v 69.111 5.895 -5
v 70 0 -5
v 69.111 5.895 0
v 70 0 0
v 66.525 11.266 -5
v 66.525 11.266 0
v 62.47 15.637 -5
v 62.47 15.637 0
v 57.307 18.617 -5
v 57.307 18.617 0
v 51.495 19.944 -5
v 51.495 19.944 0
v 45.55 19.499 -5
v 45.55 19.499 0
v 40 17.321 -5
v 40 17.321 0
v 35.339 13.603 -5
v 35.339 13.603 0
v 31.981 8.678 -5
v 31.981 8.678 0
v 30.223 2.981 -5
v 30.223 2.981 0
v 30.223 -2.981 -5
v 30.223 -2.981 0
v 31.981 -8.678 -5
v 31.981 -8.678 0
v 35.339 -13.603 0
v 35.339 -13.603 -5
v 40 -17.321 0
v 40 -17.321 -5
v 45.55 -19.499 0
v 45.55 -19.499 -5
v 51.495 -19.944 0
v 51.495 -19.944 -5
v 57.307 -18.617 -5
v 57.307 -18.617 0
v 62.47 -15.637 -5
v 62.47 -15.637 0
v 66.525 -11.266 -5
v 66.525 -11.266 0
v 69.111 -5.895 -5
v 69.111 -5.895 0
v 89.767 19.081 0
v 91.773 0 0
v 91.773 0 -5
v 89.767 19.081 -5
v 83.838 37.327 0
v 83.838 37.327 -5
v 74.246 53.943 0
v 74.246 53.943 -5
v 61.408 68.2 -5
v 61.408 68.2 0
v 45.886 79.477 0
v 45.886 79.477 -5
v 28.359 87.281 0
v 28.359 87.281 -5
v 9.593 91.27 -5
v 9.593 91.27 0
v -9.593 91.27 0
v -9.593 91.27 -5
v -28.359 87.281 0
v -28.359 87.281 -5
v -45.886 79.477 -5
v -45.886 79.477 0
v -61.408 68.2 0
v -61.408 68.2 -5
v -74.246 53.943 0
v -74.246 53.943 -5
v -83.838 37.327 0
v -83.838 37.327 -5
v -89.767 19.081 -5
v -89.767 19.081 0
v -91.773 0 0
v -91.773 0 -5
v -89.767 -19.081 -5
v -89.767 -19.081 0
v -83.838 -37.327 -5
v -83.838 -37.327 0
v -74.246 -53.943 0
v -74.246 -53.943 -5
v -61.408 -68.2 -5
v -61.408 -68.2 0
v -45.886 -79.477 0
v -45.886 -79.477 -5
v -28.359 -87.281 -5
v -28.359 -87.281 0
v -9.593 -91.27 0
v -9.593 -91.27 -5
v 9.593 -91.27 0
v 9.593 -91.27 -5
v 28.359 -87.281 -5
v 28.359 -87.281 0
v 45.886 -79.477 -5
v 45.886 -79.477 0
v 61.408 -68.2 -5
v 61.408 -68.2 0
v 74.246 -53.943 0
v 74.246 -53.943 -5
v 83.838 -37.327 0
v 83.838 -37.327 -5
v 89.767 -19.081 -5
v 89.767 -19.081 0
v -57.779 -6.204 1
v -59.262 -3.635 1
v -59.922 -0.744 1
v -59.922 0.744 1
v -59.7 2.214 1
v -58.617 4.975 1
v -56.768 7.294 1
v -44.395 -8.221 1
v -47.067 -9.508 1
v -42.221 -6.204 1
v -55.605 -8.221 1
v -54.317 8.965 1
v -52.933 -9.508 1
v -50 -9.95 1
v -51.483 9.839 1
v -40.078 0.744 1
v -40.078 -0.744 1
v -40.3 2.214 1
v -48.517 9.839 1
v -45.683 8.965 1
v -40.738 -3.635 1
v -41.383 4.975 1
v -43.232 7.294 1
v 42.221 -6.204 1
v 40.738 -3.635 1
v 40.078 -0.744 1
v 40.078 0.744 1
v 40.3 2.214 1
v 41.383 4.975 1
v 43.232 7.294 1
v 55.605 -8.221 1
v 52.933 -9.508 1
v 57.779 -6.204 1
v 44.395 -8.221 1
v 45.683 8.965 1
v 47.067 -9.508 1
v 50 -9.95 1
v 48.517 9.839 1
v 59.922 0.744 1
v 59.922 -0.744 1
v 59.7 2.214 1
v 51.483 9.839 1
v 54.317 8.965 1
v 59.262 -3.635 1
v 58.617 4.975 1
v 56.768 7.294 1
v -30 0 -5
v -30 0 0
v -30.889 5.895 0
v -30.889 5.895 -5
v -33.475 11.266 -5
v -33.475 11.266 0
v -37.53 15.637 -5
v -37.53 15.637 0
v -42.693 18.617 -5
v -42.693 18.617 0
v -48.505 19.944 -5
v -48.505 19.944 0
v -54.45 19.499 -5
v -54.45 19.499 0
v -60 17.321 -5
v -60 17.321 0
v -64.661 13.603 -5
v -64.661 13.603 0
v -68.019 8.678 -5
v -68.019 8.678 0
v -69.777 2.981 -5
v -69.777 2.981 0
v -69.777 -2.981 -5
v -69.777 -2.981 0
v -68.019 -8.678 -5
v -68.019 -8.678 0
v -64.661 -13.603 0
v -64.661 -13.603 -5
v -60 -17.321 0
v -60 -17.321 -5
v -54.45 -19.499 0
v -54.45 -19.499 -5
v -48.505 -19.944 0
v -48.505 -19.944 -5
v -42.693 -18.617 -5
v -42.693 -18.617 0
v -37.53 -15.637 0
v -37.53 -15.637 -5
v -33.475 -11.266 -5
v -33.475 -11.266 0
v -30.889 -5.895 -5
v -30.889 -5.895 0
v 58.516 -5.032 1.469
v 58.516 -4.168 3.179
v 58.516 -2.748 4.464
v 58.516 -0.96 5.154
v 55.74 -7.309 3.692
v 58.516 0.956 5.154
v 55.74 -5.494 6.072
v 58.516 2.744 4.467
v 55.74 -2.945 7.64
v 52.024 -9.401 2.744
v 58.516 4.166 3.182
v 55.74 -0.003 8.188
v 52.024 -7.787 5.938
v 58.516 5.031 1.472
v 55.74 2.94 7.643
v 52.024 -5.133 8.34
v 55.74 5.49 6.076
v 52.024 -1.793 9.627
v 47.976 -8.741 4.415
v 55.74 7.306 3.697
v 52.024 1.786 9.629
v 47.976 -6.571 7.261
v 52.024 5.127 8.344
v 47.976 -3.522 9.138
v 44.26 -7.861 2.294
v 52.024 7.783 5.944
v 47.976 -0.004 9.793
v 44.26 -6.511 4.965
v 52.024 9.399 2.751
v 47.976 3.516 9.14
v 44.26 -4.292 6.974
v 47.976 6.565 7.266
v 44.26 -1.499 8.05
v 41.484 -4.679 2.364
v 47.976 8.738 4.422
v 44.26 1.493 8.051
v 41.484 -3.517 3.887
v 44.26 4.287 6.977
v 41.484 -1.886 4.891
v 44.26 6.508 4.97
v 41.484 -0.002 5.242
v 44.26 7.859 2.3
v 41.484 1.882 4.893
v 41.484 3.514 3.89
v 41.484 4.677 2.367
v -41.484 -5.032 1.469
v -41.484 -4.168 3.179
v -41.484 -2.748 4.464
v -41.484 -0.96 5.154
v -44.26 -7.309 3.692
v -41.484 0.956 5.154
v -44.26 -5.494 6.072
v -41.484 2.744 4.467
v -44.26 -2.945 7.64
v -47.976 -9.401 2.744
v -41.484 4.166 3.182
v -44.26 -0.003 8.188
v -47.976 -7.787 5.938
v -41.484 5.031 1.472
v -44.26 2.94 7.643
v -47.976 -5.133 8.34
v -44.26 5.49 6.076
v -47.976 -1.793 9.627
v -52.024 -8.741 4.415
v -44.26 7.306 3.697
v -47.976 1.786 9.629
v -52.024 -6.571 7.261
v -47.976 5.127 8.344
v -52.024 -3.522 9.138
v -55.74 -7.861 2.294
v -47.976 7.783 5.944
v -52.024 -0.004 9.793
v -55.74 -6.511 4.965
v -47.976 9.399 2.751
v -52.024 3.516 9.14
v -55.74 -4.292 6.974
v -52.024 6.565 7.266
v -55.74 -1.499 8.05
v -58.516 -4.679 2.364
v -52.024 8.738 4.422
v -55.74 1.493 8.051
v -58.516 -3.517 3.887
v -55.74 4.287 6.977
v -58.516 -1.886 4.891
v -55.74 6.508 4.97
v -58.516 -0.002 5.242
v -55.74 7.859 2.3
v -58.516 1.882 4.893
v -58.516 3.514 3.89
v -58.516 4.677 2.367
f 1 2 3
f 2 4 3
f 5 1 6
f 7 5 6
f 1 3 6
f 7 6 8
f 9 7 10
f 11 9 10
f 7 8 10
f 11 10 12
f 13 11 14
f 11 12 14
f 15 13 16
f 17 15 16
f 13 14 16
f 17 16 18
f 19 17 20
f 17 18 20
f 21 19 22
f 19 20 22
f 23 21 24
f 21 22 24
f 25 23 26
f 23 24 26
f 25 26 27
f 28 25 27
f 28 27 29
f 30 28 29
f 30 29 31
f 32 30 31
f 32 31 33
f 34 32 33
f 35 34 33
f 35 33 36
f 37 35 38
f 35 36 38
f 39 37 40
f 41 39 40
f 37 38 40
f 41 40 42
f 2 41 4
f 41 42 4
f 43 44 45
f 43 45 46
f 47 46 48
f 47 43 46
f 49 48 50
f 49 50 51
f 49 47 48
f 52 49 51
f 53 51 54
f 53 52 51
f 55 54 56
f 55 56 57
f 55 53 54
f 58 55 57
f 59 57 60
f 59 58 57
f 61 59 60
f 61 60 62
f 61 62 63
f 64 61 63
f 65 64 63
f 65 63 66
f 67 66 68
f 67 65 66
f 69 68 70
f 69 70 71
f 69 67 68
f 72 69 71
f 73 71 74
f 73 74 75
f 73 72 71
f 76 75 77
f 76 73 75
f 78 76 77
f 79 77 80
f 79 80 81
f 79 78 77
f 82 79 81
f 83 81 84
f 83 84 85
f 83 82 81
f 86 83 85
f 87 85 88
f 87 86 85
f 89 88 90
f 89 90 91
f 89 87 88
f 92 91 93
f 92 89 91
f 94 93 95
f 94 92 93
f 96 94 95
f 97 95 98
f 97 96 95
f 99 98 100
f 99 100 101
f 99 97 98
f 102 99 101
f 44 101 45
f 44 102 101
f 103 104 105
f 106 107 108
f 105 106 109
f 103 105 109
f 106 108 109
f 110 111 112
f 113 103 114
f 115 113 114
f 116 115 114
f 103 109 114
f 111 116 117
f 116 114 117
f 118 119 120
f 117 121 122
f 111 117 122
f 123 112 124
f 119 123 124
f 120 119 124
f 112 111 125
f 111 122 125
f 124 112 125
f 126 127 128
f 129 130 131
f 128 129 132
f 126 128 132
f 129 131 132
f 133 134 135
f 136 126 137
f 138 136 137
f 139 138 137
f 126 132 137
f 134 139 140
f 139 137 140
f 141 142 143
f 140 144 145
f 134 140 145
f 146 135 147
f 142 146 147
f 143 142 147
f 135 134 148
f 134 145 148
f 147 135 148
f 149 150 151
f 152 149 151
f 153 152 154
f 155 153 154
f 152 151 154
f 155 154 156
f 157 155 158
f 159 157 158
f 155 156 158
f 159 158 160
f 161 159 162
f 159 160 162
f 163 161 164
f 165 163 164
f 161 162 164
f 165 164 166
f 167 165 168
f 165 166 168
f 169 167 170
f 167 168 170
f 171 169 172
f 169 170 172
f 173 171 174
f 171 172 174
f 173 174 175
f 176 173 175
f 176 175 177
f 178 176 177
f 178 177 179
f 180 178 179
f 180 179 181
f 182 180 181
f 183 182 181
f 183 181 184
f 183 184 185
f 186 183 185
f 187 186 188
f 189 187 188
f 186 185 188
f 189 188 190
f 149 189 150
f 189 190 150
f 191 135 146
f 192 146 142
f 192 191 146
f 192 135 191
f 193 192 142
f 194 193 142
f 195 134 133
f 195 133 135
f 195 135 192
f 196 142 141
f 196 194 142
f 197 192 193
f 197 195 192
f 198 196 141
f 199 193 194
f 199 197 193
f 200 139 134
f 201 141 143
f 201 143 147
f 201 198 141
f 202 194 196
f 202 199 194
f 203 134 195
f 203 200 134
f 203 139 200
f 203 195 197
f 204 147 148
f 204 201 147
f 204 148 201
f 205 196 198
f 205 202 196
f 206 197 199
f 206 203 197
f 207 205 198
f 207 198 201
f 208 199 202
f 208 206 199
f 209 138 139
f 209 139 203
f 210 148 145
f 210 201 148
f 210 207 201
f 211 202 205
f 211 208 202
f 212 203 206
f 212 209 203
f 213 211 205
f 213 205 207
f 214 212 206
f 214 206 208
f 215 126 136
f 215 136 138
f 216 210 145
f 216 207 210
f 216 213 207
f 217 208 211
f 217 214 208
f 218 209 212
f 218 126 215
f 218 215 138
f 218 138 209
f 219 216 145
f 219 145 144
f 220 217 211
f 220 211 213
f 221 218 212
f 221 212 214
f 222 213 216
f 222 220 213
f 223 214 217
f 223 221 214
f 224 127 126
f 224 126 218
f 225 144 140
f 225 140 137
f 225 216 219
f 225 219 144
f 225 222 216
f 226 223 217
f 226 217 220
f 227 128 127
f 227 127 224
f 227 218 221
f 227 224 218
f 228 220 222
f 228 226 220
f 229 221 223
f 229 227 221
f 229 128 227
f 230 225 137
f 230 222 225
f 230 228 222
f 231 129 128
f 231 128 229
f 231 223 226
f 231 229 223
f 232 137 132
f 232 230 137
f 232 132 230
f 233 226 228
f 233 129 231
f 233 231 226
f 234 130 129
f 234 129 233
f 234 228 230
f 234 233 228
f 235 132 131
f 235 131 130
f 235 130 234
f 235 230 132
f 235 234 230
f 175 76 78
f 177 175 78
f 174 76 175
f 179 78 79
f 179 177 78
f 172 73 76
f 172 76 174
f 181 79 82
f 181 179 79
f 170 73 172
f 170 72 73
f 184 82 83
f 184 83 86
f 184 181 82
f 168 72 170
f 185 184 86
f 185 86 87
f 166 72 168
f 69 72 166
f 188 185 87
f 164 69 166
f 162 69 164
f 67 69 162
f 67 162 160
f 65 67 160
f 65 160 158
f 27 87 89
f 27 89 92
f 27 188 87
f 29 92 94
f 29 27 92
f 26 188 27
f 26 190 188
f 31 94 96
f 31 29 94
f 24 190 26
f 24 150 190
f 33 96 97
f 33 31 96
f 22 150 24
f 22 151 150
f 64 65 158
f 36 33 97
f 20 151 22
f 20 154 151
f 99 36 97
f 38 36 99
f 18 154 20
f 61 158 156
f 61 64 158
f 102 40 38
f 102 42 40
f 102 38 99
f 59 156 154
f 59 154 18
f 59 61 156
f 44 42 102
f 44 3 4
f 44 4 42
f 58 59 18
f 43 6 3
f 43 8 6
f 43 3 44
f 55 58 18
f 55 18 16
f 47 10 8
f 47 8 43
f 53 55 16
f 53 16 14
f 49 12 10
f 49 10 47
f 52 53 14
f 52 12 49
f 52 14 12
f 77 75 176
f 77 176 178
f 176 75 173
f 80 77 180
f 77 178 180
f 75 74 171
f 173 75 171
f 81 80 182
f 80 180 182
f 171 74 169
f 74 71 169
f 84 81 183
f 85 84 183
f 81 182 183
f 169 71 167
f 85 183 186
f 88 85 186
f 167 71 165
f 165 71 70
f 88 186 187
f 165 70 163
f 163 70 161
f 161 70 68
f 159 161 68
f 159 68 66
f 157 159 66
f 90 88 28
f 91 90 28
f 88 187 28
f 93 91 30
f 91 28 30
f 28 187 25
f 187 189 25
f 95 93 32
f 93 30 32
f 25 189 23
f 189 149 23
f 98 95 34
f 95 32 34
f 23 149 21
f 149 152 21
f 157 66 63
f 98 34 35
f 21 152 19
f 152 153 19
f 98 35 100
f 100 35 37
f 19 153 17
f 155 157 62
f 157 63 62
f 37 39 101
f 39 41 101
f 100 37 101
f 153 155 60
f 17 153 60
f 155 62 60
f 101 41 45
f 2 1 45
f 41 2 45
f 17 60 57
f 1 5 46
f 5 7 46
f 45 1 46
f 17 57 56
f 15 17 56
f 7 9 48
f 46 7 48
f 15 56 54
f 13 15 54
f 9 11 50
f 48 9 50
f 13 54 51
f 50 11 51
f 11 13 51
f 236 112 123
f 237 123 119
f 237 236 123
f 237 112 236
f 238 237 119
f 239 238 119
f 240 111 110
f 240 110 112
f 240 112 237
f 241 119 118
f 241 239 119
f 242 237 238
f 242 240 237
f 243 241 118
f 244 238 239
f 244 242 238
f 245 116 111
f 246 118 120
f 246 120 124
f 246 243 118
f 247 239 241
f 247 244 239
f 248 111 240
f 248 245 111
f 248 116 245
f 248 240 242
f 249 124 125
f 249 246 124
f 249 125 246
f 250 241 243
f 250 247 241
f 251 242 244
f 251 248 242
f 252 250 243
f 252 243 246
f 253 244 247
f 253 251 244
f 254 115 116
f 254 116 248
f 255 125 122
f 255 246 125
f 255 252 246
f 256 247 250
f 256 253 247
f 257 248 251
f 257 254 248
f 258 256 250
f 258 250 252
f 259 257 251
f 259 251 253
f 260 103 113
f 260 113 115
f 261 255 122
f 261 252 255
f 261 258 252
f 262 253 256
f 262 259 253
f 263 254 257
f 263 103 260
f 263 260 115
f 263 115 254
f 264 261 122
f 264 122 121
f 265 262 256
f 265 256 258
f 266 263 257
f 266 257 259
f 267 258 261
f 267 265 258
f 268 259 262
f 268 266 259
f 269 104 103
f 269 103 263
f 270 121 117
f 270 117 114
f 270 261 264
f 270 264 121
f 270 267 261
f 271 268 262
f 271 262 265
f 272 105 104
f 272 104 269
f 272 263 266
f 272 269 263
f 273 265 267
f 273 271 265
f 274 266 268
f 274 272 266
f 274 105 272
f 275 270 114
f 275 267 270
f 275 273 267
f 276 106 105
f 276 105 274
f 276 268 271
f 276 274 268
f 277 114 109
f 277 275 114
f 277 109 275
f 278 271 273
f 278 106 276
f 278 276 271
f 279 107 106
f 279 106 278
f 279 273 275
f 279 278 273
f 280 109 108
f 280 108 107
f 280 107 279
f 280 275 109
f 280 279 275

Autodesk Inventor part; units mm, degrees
ref_plane "YZ Plane" through (0, 0, 0) normal (1, 0, 0) x (0, 1, 0)
ref_plane "XZ Plane" through (0, 0, 0) normal (0, 1, 0) x (-1, 0, 0)
ref_plane "XY Plane" through (0, 0, 0) normal (0, 0, 1) x (1, 0, 0)
sketch "Skizze1" plane through (0, 0, 0) normal (0, 0, 1) x (1, 0, 0)
  circle A0 centre (-50, 0) radius 10
  line L0 (0, 128.4817) -> (0, -128.4817) construction
  circle A1 centre (50, 0) radius 10
  line L1 (-60, 0) -> (-40, 0)
  line L2 (40, 0) -> (60, 0)
  line L3 (-128.4817, 0) -> (128.4817, 0) construction
  circle A2 centre (-50, 0) radius 20
  circle A3 centre (50, 0) radius 20
  circle A4 centre (0, 0) radius 91.7726
  dimension "d0" = 20
  dimension "d1" = 100
  dimension "d3" = 40
revolve "Umdrehung1" add sketch "Skizze1" angle 180 about axis through (0, 0, 0) along (1, 0, 0) picked at (-52.6218, 5.86) picked at (47.3782, 5.86) contours L1 A0 | L2 A1
extrude "Extrusion1" cut sketch "Skizze1" against normal blind 1 contours L1 A0 | A0 L1 | L2 A1 | A1 L2 | A2 | A3
extrude "Extrusion2" cut sketch "Skizze1" along normal blind 1 contours L1 A0 | A0 L1 | L2 A1 | A1 L2 | A2 | A3
extrude "Extrusion3" add sketch "Skizze1" against normal blind 5 contours A4
properties part number "Eyes"
